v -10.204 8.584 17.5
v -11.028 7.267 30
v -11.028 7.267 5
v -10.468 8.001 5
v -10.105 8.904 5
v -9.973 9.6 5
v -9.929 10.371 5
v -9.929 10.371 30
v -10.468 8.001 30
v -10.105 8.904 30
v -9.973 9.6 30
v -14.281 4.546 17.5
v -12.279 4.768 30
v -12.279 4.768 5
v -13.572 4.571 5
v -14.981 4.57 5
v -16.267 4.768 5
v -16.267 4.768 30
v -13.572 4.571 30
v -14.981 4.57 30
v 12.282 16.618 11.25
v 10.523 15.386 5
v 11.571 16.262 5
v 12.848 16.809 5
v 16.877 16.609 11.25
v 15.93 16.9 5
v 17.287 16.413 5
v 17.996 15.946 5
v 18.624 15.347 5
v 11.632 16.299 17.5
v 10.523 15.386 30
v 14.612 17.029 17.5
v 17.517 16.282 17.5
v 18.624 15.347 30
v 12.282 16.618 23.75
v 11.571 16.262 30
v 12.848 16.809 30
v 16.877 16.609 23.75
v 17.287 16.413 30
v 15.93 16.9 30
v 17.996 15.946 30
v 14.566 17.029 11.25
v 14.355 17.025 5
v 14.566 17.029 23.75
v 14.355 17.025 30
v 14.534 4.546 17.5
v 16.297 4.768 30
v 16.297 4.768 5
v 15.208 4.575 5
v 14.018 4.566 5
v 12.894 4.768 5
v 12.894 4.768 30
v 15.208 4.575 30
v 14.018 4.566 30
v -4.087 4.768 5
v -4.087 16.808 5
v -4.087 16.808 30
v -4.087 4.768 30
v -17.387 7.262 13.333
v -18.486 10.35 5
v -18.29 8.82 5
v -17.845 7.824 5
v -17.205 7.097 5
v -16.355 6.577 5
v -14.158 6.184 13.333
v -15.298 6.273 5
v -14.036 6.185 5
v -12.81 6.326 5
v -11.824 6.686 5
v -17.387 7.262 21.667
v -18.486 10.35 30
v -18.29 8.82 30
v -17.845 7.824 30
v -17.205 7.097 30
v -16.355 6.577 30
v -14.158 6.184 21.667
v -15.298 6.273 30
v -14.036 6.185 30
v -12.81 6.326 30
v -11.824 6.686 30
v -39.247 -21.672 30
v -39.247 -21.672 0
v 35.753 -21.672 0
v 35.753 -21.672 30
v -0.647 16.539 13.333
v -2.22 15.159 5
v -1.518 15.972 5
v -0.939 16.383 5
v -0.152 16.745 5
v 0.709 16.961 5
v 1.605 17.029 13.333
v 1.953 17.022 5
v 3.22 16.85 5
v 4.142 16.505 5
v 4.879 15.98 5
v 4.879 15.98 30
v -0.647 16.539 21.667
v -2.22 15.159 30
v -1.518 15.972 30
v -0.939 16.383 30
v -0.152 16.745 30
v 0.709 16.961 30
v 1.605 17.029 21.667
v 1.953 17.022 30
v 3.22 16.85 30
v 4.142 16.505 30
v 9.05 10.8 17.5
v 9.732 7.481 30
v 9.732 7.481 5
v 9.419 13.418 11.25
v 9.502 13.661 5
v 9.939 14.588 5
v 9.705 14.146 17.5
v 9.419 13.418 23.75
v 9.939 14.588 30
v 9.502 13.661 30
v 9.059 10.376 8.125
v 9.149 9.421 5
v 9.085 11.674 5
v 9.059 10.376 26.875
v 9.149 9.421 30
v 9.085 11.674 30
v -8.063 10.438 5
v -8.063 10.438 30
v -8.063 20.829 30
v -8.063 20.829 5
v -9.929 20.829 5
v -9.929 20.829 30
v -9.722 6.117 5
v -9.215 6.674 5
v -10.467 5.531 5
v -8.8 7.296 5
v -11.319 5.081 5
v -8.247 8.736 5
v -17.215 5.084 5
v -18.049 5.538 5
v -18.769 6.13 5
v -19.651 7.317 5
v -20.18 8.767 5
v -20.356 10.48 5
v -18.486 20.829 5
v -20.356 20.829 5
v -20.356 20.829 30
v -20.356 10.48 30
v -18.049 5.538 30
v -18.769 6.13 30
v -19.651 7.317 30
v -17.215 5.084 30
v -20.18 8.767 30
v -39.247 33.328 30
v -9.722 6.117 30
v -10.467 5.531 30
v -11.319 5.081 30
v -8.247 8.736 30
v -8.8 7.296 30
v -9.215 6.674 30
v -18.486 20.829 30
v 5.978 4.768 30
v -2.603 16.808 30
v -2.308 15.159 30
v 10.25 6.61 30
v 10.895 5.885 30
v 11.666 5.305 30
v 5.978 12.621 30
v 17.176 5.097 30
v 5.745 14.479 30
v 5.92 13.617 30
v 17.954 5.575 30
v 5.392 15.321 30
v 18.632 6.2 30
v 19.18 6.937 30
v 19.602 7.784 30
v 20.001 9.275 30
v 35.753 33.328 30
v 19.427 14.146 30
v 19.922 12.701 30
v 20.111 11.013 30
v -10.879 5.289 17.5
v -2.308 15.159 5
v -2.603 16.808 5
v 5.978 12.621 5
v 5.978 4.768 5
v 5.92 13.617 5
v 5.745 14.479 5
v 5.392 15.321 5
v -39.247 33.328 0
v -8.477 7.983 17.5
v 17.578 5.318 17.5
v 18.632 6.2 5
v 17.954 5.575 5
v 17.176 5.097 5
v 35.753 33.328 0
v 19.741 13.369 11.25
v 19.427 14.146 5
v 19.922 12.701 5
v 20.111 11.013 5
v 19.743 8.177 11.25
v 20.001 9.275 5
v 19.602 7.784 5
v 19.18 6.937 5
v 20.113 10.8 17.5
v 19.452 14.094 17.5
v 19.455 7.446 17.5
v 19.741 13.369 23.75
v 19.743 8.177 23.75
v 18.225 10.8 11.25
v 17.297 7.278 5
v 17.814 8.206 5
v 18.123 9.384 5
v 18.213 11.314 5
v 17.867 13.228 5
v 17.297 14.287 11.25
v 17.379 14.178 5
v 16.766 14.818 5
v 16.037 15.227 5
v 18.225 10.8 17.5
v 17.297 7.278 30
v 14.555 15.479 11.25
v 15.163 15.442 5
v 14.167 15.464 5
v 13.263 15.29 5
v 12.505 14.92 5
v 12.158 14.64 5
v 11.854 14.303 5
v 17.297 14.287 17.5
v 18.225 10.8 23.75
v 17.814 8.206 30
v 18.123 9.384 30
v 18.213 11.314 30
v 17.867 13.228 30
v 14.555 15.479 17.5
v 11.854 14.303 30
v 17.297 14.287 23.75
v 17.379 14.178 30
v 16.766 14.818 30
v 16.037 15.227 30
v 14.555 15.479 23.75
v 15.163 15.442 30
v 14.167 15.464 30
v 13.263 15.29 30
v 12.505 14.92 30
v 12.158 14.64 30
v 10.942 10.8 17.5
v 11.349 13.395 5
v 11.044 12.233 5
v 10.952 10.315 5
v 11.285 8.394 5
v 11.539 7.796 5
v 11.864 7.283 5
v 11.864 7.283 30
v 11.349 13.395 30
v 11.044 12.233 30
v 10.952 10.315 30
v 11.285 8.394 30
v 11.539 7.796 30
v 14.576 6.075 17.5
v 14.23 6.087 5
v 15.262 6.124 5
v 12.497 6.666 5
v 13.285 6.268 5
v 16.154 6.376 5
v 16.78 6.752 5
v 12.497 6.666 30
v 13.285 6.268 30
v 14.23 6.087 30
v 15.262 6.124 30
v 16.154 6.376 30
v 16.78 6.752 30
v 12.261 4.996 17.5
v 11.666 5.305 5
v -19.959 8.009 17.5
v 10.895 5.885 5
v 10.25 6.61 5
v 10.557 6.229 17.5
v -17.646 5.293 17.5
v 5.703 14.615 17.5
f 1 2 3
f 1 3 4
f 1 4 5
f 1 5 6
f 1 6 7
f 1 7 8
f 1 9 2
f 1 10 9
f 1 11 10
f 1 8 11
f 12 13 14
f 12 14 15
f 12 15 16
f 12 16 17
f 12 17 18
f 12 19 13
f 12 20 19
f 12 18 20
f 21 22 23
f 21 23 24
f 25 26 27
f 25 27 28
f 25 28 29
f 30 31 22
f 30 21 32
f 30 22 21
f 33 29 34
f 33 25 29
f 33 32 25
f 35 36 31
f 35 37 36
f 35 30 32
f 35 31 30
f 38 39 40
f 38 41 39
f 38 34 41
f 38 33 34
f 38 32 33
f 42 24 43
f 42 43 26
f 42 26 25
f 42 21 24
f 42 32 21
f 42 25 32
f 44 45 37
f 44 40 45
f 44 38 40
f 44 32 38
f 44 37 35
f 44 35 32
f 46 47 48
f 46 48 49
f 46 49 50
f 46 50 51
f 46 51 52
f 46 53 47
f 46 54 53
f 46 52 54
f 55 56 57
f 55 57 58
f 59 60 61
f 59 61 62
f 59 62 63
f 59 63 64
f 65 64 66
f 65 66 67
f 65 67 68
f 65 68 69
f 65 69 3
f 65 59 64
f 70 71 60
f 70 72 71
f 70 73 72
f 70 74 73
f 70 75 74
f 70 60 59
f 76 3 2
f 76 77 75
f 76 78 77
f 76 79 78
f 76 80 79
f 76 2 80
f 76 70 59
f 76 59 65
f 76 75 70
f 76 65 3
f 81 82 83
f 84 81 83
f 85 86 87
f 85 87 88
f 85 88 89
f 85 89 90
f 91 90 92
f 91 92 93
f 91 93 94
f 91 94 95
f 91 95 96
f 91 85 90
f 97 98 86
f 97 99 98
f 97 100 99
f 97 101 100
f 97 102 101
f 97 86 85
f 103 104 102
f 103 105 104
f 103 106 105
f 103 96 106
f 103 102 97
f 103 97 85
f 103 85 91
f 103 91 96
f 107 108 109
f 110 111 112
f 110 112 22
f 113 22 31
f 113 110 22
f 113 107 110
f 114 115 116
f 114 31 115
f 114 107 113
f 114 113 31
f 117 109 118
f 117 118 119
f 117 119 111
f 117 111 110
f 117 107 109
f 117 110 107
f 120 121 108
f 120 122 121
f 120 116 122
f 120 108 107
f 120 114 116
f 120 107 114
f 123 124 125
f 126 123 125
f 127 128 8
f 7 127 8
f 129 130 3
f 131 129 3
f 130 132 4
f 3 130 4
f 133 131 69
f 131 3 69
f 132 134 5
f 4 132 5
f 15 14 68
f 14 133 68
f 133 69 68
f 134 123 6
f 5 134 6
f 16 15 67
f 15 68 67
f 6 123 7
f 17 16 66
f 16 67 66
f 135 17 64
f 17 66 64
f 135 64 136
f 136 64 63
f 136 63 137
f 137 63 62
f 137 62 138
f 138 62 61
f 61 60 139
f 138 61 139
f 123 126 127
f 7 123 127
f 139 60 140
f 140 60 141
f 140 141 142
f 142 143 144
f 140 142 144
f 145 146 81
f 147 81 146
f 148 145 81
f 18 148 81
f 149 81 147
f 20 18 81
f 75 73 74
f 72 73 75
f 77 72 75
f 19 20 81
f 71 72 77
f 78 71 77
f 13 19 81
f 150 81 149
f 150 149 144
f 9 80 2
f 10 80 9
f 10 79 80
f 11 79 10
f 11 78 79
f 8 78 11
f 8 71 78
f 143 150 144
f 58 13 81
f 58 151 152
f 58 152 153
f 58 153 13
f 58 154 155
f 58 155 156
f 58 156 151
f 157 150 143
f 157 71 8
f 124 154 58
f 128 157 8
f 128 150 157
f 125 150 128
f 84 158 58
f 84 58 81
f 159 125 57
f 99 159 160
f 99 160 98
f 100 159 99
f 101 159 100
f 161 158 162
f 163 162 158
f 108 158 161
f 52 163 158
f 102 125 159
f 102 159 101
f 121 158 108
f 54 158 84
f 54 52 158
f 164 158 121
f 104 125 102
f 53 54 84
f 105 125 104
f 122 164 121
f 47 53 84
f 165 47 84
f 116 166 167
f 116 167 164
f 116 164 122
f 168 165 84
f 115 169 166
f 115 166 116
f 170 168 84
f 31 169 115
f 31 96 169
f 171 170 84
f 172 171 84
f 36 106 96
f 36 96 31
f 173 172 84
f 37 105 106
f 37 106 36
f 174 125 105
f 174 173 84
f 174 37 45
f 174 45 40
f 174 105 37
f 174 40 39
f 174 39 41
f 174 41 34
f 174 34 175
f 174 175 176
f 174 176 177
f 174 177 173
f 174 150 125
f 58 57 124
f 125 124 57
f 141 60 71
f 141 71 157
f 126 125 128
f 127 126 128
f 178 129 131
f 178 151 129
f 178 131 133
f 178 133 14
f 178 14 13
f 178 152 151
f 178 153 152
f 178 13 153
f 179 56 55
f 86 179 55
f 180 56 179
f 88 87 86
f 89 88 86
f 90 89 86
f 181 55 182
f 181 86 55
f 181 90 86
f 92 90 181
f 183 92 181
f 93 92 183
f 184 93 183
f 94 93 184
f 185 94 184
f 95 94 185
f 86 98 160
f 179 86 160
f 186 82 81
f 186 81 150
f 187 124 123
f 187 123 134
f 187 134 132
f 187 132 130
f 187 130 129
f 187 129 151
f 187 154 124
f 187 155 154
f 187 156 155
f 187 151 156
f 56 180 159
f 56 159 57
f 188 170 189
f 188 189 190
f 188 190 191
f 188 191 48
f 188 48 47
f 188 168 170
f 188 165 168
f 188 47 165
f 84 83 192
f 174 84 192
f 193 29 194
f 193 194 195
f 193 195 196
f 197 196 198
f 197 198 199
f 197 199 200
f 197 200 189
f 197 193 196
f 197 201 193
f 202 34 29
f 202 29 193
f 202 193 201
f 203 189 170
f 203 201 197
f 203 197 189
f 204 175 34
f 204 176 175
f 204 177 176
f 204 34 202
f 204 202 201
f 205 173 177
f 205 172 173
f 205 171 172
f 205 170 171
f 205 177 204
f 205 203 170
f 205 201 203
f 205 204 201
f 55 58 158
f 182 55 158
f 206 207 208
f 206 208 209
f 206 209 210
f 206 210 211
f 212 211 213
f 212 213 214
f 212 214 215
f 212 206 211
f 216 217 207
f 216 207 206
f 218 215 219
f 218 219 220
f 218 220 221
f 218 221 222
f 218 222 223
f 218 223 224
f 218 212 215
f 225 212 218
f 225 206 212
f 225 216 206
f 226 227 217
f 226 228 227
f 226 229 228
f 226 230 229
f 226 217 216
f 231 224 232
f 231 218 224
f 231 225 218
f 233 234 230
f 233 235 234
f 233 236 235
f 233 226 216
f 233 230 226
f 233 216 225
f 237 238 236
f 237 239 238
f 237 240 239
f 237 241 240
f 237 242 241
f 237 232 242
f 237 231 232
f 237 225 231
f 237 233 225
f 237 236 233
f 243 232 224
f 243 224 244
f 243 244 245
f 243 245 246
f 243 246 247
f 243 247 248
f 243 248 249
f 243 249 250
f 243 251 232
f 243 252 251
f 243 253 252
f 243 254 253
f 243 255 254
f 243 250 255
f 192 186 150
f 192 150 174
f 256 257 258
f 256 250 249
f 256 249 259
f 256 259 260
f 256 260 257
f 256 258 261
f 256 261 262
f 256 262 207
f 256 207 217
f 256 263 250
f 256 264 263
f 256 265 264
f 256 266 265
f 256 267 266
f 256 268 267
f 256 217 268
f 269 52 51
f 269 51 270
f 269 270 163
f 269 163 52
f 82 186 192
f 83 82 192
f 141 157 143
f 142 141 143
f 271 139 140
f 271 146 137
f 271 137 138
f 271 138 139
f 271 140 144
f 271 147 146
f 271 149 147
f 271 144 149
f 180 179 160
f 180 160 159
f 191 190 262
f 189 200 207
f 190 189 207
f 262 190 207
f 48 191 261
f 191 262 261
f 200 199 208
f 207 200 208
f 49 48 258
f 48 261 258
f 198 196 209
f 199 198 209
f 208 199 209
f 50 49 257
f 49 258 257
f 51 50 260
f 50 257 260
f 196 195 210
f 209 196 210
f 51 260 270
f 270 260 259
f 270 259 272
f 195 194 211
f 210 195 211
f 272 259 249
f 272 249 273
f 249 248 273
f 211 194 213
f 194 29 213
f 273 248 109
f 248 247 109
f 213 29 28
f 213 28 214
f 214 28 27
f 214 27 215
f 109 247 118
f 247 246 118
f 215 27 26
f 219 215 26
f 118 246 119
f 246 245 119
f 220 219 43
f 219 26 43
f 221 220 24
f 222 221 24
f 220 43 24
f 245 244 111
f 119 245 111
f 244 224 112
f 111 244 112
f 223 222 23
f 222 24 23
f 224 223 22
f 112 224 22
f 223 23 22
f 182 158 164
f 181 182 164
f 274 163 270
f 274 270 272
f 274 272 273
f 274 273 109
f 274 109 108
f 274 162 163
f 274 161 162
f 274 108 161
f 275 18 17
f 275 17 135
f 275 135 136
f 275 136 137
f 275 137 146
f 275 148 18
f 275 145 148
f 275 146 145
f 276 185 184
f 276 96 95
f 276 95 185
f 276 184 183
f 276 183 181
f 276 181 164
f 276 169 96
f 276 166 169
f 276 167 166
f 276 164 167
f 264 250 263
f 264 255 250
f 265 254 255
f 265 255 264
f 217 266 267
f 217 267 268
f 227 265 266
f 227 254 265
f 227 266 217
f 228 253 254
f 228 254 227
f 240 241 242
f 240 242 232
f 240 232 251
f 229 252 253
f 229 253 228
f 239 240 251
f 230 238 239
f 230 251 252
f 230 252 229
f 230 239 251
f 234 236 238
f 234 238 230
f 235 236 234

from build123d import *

# Parameters (mm, degrees)
F0_W     = 75
F0_H     = 55
F1_DEPTH = 30
F3_DEPTH = 25


with BuildPart() as f1:
    # F0 (on Top) → F1 (new body)
    with BuildSketch(Plane.XY):
        with Locations((-1.7472282052, 5.8279882101)):
            Rectangle(F0_W, F0_H)
    extrude(amount=F1_DEPTH)

    # F2 (on face) → F3 (cut)
    with BuildSketch(Plane.XY.offset(30)):
        with BuildLine():
            Line((-4.0867042615, 16.8077548728), (-4.0867042615, 4.7675450332))
            Line((-4.0867042615, 4.7675450332), (-2.2622169894, 4.7675450332))
            Line((-2.2622169894, 4.7675450332), (-2.2622169894, 11.0847003856))
            add(Edge.make_bspline(
                [(-1.3833695559, 14.4577168355), (-2.2622169894, 13.4364961177), (-2.2622169894, 11.0847003856)],
                knots=[0, 0, 0, 1, 1, 1], degree=2))
            add(Edge.make_bspline(
                [(1.3832421649, 15.4789375533), (-0.5045221224, 15.4789375533), (-1.3833695559, 14.4577168355)],
                knots=[0, 0, 0, 1, 1, 1], degree=2))
            add(Edge.make_bspline(
                [(3.4836875311, 14.7530095732), (2.8140057867, 15.4789375533), (1.3832421649, 15.4789375533)],
                knots=[0, 0, 0, 1, 1, 1], degree=2))
            add(Edge.make_bspline(
                [(4.1533692754, 12.5576486842), (4.1533692754, 14.0270815931), (3.4836875311, 14.7530095732)],
                knots=[0, 0, 0, 1, 1, 1], degree=2))
            Line((4.1533692754, 12.5576486842), (4.1533692754, 4.7675450332))
            Line((4.1533692754, 4.7675450332), (5.9778565475, 4.7675450332))
            Line((5.9778565475, 4.7675450332), (5.9778565475, 12.6209256994))
            add(Edge.make_bspline(
                [(4.8792972555, 15.9798805904), (5.9778565475, 14.9305367547), (5.9778565475, 12.6209256994)],
                knots=[0, 0, 0, 1, 1, 1], degree=2))
            add(Edge.make_bspline(
                [(1.6047117181, 17.029224426), (3.7807379636, 17.029224426), (4.8792972555, 15.9798805904)],
                knots=[0, 0, 0, 1, 1, 1], degree=2))
            add(Edge.make_bspline(
                [(-0.6468954066, 16.5388275581), (0.363779142, 17.029224426), (1.6047117181, 17.029224426)],
                knots=[0, 0, 0, 1, 1, 1], degree=2))
            add(Edge.make_bspline(
                [(-2.2200323126, 15.1590370875), (-1.6575699552, 16.0484306902), (-0.6468954066, 16.5388275581)],
                knots=[0, 0, 0, 1, 1, 1], degree=2))
            Line((-2.2200323126, 15.1590370875), (-2.307917056, 15.1590370875))
            Line((-2.307917056, 15.1590370875), (-2.6032097937, 16.8077548728))
            Line((-2.6032097937, 16.8077548728), (-4.0867042615, 16.8077548728))
        make_face()
        with BuildLine():
            add(Edge.make_bspline(
                [(-12.2786519386, 4.7675450332), (-13.1925449458, 4.54607548), (-14.2813344906, 4.54607548)],
                knots=[0.6245807712, 0.6245807712, 0.6245807712, 1, 1, 1], degree=2))
            Line((-12.2786519386, 4.7675450332), (-16.2668224103, 4.7675450332))
            add(Edge.make_bspline(
                [(-14.2813344906, 4.54607548), (-15.3658863063, 4.54607548), (-16.2668224103, 4.7675450332)],
                knots=[0, 0, 0, 0.3739580419, 0.3739580419, 0.3739580419], degree=2))
        make_face()
        with BuildLine():
            Line((-16.2668224103, 4.7675450332), (-12.2786519386, 4.7675450332))
            add(Edge.make_bspline(
                [(-9.7218740054, 6.1174546912), (-10.7582183658, 5.1360014515), (-12.2786519386, 4.7675450332)],
                knots=[0, 0, 0, 0.6245807712, 0.6245807712, 0.6245807712], degree=2))
            add(Edge.make_bspline(
                [(-8.0626100508, 10.4378686745), (-8.0626100508, 7.6888339023), (-9.7218740054, 6.1174546912)],
                knots=[0, 0, 0, 1, 1, 1], degree=2))
            Line((-8.0626100508, 10.4378686745), (-8.0626100508, 20.8293607287))
            Line((-8.0626100508, 20.8293607287), (-9.9292819997, 20.8293607287))
            Line((-9.9292819997, 20.8293607287), (-9.9292819997, 10.3710762695))
            add(Edge.make_bspline(
                [(-11.0278412916, 7.2669871342), (-9.9292819997, 8.3497271724), (-9.9292819997, 10.3710762695)],
                knots=[0, 0, 0, 1, 1, 1], degree=2))
            add(Edge.make_bspline(
                [(-14.1582958499, 6.1842470961), (-12.1264005835, 6.1842470961), (-11.0278412916, 7.2669871342)],
                knots=[0, 0, 0, 1, 1, 1], degree=2))
            add(Edge.make_bspline(
                [(-17.3871813207, 7.2617140496), (-16.2886220288, 6.1842470961), (-14.1582958499, 6.1842470961)],
                knots=[0, 0, 0, 1, 1, 1], degree=2))
            add(Edge.make_bspline(
                [(-18.4857406127, 10.3499839311), (-18.4857406127, 8.3391810032), (-17.3871813207, 7.2617140496)],
                knots=[0, 0, 0, 1, 1, 1], degree=2))
            Line((-18.4857406127, 10.3499839311), (-18.4857406127, 20.8293607287))
            Line((-18.4857406127, 20.8293607287), (-20.3559279512, 20.8293607287))
            Line((-20.3559279512, 20.8293607287), (-20.3559279512, 10.4800533513))
            add(Edge.make_bspline(
                [(-18.7687294863, 6.1297585552), (-20.3559279512, 7.7134416305), (-20.3559279512, 10.4800533513)],
                knots=[0, 0, 0, 1, 1, 1], degree=2))
            add(Edge.make_bspline(
                [(-16.2668224103, 4.7675450332), (-17.7750766513, 5.1383065018), (-18.7687294863, 6.1297585552)],
                knots=[0.3739580419, 0.3739580419, 0.3739580419, 1, 1, 1], degree=2))
        make_face()
        with BuildLine():
            add(Edge.make_bspline(
                [(12.8943034011, 4.7675450332), (12.2413601129, 4.9561574078), (11.6657571374, 5.3053996626)],
                knots=[0.5400617249, 0.5400617249, 0.5400617249, 1, 1, 1], degree=2))
            Line((12.8943034011, 4.7675450332), (16.2966207559, 4.7675450332))
            add(Edge.make_bspline(
                [(18.6315018956, 6.2000663499), (17.691967628, 5.1513098305), (16.2966207559, 4.7675450332)],
                knots=[0, 0, 0, 0.6340763655, 0.6340763655, 0.6340763655], degree=2))
            add(Edge.make_bspline(
                [(20.1132386686, 10.7999538171), (20.1132386686, 7.8540572199), (18.6315018956, 6.2000663499)],
                knots=[0, 0, 0, 1, 1, 1], degree=2))
            add(Edge.make_bspline(
                [(18.6244711162, 15.3471104382), (20.1132386686, 13.6649964504), (20.1132386686, 10.7999538171)],
                knots=[0, 0, 0, 1, 1, 1], degree=2))
            add(Edge.make_bspline(
                [(14.6116537346, 17.029224426), (17.1357035637, 17.029224426), (18.6244711162, 15.3471104382)],
                knots=[0, 0, 0, 1, 1, 1], degree=2))
            add(Edge.make_bspline(
                [(10.5232554737, 15.3857797253), (11.9962037724, 17.029224426), (14.6116537346, 17.029224426)],
                knots=[0, 0, 0, 1, 1, 1], degree=2))
            add(Edge.make_bspline(
                [(9.0503071751, 10.7999538171), (9.0503071751, 13.7423350246), (10.5232554737, 15.3857797253)],
                knots=[0, 0, 0, 1, 1, 1], degree=2))
            add(Edge.make_bspline(
                [(9.7322927836, 7.481425908), (9.0503071751, 8.8981279709), (9.0503071751, 10.7999538171)],
                knots=[0, 0, 0, 1, 1, 1], degree=2))
            add(Edge.make_bspline(
                [(11.6657571374, 5.3053996626), (10.414278392, 6.0647238452), (9.7322927836, 7.481425908)],
                knots=[0, 0, 0, 1, 1, 1], degree=2))
        make_face()
        with BuildLine():
            add(Edge.make_bspline(
                [(10.9415868521, 10.7999538171), (10.9415868521, 8.4903427617), (11.8643766573, 7.282806388)],
                knots=[0, 0, 0, 1, 1, 1], degree=2))
            add(Edge.make_bspline(
                [(11.8538304881, 14.3030396872), (10.9415868521, 13.1271418211), (10.9415868521, 10.7999538171)],
                knots=[0, 0, 0, 1, 1, 1], degree=2))
            add(Edge.make_bspline(
                [(14.5554074988, 15.4789375533), (12.7660741242, 15.4789375533), (11.8538304881, 14.3030396872)],
                knots=[0, 0, 0, 1, 1, 1], degree=2))
            add(Edge.make_bspline(
                [(17.2974114915, 14.2872204334), (16.3693486017, 15.4789375533), (14.5554074988, 15.4789375533)],
                knots=[0, 0, 0, 1, 1, 1], degree=2))
            add(Edge.make_bspline(
                [(18.2254743813, 10.7999538171), (18.2254743813, 13.0955033135), (17.2974114915, 14.2872204334)],
                knots=[0, 0, 0, 1, 1, 1], degree=2))
            add(Edge.make_bspline(
                [(17.2974114915, 7.2775333034), (18.2254743813, 8.4797965925), (18.2254743813, 10.7999538171)],
                knots=[0, 0, 0, 1, 1, 1], degree=2))
            add(Edge.make_bspline(
                [(14.5764998373, 6.0752700144), (16.3693486017, 6.0752700144), (17.2974114915, 7.2775333034)],
                knots=[0, 0, 0, 1, 1, 1], degree=2))
            add(Edge.make_bspline(
                [(11.8643766573, 7.282806388), (12.7871664626, 6.0752700144), (14.5764998373, 6.0752700144)],
                knots=[0, 0, 0, 1, 1, 1], degree=2))
        make_face(mode=Mode.SUBTRACT)
        with BuildLine():
            Line((16.2966207559, 4.7675450332), (12.8943034011, 4.7675450332))
            add(Edge.make_bspline(
                [(14.5343151604, 4.54607548), (13.6609925365, 4.54607548), (12.8943034011, 4.7675450332)],
                knots=[0, 0, 0, 0.5400617249, 0.5400617249, 0.5400617249], degree=2))
            add(Edge.make_bspline(
                [(16.2966207559, 4.7675450332), (15.4913701164, 4.54607548), (14.5343151604, 4.54607548)],
                knots=[0.6340763655, 0.6340763655, 0.6340763655, 1, 1, 1], degree=2))
        make_face()
        with BuildLine():
            Line((-2.2622169894, 11.0847003856), (-2.2622169894, 4.7675450332))
            Line((-2.2622169894, 4.7675450332), (4.1533692754, 4.7675450332))
            Line((4.1533692754, 4.7675450332), (4.1533692754, 12.5576486842))
            add(Edge.make_bspline(
                [(4.1533692754, 12.5576486842), (4.1533692754, 14.0270815931), (3.4836875311, 14.7530095732)],
                knots=[0, 0, 0, 1, 1, 1], degree=2))
            add(Edge.make_bspline(
                [(3.4836875311, 14.7530095732), (2.8140057867, 15.4789375533), (1.3832421649, 15.4789375533)],
                knots=[0, 0, 0, 1, 1, 1], degree=2))
            add(Edge.make_bspline(
                [(1.3832421649, 15.4789375533), (-0.5045221224, 15.4789375533), (-1.3833695559, 14.4577168355)],
                knots=[0, 0, 0, 1, 1, 1], degree=2))
            add(Edge.make_bspline(
                [(-1.3833695559, 14.4577168355), (-2.2622169894, 13.4364961177), (-2.2622169894, 11.0847003856)],
                knots=[0, 0, 0, 1, 1, 1], degree=2))
        make_face()
    extrude(amount=-F3_DEPTH, mode=Mode.SUBTRACT)


solid = f1.part
